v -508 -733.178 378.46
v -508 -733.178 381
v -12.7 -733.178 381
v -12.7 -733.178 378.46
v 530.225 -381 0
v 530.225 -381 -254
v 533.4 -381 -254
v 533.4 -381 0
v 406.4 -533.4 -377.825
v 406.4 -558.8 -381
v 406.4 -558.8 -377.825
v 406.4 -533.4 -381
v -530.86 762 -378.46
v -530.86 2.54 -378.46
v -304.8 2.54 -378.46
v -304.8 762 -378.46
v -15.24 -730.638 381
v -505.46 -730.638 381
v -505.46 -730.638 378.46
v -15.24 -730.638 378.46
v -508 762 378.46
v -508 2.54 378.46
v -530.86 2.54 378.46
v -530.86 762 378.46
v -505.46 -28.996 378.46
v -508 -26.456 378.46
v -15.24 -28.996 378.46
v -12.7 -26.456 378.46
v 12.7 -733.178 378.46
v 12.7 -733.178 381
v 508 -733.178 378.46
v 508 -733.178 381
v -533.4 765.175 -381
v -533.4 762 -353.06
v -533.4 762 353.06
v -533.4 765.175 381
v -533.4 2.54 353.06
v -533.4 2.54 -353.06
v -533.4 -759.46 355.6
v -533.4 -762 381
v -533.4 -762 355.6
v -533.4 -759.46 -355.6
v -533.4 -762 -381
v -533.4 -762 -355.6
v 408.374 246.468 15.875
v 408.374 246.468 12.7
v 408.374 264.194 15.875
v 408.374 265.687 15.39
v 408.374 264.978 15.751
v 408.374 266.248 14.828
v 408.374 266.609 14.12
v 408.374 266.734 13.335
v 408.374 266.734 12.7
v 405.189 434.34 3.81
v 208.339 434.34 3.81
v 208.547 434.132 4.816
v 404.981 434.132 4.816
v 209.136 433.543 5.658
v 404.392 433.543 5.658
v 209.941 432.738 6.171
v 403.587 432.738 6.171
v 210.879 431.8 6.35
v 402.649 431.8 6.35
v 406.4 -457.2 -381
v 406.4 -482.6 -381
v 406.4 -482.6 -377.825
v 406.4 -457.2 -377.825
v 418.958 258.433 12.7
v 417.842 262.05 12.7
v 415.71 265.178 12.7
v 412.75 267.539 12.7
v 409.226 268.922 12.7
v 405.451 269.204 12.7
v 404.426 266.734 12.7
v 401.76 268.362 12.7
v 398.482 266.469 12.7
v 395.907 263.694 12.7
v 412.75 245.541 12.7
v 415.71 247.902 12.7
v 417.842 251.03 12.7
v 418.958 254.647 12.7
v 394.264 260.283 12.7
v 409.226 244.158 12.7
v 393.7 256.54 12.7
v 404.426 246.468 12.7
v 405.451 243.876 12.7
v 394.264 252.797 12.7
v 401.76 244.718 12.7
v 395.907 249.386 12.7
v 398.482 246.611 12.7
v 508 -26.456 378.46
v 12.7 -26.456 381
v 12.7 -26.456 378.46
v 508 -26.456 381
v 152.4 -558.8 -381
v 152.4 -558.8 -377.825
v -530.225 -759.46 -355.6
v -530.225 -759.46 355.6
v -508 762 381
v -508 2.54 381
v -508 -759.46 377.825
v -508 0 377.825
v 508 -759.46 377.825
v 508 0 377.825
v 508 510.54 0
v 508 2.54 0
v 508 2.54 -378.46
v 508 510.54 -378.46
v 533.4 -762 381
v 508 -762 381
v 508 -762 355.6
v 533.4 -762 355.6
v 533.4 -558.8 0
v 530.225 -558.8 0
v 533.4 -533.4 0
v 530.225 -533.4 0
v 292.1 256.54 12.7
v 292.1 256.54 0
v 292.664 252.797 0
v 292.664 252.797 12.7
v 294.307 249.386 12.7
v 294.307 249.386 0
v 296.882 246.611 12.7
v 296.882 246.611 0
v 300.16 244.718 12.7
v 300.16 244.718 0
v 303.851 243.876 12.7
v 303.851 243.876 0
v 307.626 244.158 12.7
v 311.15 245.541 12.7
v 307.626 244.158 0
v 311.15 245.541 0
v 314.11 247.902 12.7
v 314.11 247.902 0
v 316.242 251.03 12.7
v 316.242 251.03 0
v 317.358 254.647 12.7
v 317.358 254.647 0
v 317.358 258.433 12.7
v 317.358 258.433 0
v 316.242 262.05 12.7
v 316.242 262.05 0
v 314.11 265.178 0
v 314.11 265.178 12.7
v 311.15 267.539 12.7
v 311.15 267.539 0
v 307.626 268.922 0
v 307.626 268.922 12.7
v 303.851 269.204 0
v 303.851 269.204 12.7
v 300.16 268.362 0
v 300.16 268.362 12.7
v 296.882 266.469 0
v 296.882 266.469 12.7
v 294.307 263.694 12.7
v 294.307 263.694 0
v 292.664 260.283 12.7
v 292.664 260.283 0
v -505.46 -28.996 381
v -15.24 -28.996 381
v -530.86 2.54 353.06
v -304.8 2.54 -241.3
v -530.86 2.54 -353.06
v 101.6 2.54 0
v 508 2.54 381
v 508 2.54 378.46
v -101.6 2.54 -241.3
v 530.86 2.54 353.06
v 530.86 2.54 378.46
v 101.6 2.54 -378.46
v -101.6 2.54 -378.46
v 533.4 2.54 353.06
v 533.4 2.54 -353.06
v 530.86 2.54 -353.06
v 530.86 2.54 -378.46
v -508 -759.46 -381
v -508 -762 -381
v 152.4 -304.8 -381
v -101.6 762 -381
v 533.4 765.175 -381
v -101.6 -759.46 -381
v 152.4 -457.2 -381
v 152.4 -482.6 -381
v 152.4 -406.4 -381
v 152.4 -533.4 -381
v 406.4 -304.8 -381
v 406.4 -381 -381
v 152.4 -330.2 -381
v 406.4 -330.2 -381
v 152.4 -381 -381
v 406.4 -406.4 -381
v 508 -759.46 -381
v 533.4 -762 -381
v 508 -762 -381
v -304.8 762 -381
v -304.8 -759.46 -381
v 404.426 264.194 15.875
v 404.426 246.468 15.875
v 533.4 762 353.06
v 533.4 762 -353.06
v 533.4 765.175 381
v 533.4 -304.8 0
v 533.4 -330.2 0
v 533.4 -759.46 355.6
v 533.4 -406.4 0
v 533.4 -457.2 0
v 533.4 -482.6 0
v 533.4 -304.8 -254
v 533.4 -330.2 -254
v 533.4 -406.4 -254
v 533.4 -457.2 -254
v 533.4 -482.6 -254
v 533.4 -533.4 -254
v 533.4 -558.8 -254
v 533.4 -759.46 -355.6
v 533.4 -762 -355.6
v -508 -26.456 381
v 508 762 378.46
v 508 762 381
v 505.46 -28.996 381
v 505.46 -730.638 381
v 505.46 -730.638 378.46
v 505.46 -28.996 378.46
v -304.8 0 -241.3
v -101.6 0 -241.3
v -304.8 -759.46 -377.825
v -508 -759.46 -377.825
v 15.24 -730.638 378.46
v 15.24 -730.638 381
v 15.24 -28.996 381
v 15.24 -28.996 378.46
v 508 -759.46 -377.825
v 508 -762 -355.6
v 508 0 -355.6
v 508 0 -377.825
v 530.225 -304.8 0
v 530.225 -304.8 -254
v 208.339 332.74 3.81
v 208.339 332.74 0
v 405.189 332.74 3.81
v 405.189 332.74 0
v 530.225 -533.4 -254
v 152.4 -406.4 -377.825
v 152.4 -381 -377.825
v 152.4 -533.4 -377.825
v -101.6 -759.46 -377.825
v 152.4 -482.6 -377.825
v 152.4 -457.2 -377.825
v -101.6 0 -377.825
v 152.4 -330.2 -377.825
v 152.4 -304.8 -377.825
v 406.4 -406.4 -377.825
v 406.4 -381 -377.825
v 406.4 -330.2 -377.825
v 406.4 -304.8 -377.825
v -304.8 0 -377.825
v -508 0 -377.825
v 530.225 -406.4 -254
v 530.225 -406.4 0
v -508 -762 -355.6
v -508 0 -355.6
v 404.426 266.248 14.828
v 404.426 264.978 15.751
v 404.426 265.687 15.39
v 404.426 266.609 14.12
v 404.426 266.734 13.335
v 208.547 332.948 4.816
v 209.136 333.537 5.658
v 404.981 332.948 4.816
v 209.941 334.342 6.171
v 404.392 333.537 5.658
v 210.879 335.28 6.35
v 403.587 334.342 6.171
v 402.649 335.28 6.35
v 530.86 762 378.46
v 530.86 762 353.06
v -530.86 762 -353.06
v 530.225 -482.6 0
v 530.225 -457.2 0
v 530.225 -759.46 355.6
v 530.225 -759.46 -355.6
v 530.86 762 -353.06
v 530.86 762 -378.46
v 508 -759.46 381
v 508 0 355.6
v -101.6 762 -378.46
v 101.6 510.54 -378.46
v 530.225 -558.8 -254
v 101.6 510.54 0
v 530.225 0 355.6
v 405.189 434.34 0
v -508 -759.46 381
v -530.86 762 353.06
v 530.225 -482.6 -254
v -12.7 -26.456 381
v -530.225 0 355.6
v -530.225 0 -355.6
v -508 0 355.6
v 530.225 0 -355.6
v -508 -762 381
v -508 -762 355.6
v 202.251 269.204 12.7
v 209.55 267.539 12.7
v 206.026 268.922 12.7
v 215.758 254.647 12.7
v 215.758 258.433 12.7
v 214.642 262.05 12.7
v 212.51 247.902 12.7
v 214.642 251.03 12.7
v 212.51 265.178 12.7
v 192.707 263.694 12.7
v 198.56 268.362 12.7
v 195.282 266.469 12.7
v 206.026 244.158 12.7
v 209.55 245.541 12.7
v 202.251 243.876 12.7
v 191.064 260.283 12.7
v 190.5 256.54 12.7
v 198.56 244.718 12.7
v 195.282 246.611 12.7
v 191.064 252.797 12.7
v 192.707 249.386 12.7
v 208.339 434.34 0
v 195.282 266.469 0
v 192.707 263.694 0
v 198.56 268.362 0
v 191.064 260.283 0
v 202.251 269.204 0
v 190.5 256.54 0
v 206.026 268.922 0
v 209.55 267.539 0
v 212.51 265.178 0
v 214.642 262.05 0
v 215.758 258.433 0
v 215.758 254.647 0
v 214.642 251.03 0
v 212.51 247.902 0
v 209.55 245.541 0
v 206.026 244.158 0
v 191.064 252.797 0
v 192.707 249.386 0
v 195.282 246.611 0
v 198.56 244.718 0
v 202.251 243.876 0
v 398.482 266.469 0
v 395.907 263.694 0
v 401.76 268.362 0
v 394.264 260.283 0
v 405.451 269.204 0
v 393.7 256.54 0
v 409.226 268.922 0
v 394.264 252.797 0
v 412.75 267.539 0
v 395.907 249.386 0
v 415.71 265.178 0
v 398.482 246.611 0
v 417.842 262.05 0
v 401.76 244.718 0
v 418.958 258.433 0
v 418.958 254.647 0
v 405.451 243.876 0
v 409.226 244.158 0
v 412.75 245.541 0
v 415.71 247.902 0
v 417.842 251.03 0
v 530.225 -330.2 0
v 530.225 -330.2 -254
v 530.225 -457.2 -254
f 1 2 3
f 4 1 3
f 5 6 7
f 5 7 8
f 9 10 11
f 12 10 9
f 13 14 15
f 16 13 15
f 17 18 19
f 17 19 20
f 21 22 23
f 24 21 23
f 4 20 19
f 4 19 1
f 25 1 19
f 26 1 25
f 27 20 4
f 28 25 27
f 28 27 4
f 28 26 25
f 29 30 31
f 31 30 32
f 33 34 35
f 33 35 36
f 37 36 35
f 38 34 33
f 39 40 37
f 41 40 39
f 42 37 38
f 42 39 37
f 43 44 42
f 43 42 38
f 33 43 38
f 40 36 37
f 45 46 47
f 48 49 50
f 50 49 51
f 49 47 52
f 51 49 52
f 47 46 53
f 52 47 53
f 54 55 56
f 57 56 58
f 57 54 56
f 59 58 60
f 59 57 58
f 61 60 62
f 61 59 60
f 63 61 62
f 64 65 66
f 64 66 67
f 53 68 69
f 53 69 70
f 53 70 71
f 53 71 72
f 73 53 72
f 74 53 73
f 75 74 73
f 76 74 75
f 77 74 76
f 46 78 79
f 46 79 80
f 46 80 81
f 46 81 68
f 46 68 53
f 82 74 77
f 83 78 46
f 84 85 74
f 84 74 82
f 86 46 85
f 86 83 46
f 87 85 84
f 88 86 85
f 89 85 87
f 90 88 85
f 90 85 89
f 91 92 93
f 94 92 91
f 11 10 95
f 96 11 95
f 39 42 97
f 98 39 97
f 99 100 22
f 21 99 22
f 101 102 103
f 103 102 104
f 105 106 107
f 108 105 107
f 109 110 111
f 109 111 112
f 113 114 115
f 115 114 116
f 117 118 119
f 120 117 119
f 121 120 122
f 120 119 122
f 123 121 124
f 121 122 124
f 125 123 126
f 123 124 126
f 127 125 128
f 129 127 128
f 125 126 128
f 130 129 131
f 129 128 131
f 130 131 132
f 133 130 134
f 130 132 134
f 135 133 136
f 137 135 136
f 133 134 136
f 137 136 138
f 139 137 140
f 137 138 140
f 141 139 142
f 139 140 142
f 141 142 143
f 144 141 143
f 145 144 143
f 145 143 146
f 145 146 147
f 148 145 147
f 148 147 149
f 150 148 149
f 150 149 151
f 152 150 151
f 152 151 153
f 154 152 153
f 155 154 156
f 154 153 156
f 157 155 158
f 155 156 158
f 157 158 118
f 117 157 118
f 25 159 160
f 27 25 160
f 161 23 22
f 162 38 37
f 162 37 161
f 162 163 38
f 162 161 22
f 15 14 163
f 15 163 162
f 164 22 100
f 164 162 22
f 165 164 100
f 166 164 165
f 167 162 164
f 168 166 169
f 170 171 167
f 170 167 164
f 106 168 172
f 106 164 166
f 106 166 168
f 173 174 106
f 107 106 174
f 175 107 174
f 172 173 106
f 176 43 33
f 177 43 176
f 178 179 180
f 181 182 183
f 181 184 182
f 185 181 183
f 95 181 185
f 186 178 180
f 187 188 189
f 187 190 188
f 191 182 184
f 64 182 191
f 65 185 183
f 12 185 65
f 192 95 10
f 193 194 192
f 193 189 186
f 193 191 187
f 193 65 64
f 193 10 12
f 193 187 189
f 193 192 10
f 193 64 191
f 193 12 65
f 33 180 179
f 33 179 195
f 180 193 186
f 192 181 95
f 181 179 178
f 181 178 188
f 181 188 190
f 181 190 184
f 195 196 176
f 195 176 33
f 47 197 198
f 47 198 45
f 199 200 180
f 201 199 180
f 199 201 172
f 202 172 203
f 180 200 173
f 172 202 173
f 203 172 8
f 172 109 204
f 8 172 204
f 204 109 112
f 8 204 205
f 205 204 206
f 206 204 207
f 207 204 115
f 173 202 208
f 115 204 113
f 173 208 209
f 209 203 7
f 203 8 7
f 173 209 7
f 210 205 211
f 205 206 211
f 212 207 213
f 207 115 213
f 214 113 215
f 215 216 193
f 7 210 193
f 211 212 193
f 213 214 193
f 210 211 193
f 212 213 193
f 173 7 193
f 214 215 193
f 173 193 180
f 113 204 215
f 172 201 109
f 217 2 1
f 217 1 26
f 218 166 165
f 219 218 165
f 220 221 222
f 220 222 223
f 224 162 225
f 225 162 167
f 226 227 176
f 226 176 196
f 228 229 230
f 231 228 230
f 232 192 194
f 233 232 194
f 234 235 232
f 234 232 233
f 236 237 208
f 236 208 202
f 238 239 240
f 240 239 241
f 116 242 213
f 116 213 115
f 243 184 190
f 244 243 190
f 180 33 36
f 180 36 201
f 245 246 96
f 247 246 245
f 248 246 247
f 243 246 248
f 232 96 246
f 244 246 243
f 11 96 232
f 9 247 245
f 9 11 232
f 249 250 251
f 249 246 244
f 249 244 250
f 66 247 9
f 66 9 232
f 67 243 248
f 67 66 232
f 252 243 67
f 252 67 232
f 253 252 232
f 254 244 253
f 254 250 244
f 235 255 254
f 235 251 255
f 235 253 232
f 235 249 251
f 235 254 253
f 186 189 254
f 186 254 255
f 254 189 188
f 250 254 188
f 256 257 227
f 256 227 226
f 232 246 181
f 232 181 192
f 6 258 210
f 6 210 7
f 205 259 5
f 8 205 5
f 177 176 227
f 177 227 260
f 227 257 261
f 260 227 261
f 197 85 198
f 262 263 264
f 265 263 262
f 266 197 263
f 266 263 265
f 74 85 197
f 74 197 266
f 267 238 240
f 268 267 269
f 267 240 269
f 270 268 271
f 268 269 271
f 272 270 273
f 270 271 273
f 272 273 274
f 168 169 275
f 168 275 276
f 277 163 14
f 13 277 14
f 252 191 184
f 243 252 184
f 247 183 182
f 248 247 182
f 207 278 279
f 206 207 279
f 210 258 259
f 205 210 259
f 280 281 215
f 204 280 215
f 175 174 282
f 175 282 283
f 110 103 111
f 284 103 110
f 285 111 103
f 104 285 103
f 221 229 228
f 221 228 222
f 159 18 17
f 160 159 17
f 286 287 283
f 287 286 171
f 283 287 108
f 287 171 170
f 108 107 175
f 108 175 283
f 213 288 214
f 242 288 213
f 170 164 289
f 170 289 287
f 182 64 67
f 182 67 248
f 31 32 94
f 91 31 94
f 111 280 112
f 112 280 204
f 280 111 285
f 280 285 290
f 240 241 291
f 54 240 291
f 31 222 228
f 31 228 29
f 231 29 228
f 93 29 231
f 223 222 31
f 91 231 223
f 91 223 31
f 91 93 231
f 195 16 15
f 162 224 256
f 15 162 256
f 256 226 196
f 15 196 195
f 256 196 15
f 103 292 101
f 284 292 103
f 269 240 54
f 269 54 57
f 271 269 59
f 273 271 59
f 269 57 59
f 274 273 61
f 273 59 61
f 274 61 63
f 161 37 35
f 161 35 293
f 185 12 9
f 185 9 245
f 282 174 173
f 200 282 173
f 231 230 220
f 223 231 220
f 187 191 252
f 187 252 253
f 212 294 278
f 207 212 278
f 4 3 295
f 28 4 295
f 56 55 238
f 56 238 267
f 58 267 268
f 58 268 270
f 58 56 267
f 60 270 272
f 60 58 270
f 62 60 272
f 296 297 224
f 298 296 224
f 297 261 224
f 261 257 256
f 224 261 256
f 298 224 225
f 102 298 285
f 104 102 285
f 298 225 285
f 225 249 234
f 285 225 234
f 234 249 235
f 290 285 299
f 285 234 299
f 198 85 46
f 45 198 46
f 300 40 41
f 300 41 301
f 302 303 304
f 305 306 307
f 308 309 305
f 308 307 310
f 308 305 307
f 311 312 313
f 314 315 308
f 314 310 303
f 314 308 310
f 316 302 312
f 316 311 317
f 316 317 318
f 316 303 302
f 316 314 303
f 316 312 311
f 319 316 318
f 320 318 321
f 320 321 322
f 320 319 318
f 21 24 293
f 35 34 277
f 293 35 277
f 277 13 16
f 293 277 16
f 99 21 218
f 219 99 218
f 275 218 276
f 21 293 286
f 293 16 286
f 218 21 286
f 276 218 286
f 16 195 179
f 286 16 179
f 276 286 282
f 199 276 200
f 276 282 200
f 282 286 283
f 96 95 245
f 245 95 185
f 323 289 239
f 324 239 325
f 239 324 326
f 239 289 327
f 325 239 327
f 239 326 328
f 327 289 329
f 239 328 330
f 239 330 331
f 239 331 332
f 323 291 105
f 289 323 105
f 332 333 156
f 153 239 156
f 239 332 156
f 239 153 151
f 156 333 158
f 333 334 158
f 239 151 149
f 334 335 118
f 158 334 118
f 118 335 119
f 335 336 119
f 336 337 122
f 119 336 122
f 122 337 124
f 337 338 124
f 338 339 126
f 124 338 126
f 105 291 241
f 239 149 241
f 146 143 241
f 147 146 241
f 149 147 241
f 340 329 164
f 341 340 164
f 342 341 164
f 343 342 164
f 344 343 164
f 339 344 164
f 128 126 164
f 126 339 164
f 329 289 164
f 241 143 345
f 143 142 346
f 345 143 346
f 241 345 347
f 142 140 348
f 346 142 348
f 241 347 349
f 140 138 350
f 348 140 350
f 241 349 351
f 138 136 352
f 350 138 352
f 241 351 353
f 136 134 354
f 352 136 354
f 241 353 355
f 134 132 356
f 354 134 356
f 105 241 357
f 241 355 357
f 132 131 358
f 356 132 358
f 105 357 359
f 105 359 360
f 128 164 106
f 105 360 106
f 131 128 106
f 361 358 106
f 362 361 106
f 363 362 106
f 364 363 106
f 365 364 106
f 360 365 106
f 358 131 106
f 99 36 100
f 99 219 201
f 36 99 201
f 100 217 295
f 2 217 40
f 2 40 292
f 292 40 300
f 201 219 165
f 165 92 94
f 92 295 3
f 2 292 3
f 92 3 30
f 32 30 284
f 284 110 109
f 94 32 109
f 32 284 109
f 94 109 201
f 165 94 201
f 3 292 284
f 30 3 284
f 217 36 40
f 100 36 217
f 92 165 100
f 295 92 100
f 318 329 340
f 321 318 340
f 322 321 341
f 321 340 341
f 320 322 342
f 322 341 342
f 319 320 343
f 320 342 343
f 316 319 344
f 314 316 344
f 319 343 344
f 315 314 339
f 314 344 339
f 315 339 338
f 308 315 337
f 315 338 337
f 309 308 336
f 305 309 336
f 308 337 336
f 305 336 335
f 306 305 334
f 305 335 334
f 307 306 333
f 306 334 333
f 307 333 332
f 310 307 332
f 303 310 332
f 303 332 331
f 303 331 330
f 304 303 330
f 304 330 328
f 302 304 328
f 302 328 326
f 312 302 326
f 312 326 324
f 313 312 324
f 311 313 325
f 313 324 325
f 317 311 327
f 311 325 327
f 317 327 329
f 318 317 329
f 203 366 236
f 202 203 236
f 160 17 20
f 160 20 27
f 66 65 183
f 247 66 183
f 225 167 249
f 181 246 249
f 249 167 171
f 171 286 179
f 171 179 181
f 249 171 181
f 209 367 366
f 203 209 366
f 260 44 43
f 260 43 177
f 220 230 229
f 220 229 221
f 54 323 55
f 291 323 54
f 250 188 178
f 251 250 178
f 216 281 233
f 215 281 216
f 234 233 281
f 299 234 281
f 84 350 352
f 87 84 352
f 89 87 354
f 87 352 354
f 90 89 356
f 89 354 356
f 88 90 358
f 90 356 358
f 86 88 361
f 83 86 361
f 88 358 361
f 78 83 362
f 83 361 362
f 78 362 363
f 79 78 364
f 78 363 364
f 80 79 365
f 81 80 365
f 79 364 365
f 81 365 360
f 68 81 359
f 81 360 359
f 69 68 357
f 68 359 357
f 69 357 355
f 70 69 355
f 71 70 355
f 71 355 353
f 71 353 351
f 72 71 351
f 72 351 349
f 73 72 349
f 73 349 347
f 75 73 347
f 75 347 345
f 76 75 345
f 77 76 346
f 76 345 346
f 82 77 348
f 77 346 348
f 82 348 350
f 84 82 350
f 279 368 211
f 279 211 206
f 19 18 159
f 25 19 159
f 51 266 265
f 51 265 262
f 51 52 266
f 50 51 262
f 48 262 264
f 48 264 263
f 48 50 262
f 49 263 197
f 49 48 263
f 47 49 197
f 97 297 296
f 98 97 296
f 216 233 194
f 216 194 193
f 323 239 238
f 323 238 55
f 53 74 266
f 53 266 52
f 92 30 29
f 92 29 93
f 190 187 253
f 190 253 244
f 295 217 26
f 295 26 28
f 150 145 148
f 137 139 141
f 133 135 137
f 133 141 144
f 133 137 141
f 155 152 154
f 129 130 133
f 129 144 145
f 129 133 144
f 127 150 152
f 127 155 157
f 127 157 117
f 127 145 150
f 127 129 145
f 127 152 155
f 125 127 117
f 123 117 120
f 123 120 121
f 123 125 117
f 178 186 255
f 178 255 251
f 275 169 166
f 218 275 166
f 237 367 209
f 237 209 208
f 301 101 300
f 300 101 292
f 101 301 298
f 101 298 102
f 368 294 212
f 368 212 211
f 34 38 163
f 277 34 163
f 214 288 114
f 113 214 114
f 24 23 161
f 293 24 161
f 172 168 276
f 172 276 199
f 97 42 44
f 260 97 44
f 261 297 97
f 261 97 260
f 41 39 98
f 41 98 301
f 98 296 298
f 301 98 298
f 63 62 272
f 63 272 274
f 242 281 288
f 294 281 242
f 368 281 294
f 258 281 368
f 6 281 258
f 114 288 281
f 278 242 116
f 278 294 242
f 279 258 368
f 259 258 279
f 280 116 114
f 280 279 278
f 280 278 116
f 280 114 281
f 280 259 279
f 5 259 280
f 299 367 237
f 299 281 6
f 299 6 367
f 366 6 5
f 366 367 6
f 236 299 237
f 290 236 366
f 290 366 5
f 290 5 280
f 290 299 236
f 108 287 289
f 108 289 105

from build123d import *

# Parameters (mm, degrees)
SKETCH1_W            = 1066.8
SKETCH1_H            = 762
BOSS_EXTRUDE1_DEPTH  = 2.54
SKETCH2_W            = 203.2
SKETCH2_H            = 139.7
CUT_EXTRUDE1_DEPTH   = 656.50210648
SKETCH3_W            = 25.4
SKETCH3_H            = 25.4
BOSS_EXTRUDE2_DEPTH  = 762
SKETCH4_W            = 406.4
SKETCH4_H            = 381
BOSS_EXTRUDE3_DEPTH  = 508
SKETCH5_R            = 12.7
BOSS_EXTRUDE4_DEPTH  = 12.7
SKETCH6_W            = 3.94766101
SKETCH6_H            = 20.265990969
BOSS_EXTRUDE5_DEPTH  = 3.175
FILLET1_R            = 2.54
SKETCH7_W            = 196.85
SKETCH7_H            = 101.6
BOSS_EXTRUDE6_DEPTH  = 6.35
FILLET2_R            = 2.54
SKETCH8_W            = 2.54
SKETCH8_H            = 25.4
SKETCH8_W_2          = 203.2
SKETCH8_H_2          = 2.54
SKETCH8_W_3          = 406.4
BOSS_EXTRUDE7_DEPTH  = 759.46
SKETCH9_W            = 1066.8
SKETCH9_H            = 762
BOSS_EXTRUDE8_DEPTH  = 3.175
SKETCH11_W           = 1016
SKETCH11_H           = 3.175
SKETCH11_W_2         = 3.175
SKETCH11_H_2         = 711.2
SKETCH11_W_3         = 203.2
SKETCH11_W_4         = 609.6
BOSS_EXTRUDE10_DEPTH = 759.46
CUT_EXTRUDE3_REACH   = 1366.534
SKETCH12_W           = 254
SKETCH12_H           = 25.4
CUT_EXTRUDE4_REACH   = 1206.43
SKETCH13_W           = 254
SKETCH13_H           = 25.4
SKETCH14_W           = 495.3
SKETCH14_H           = 706.721299259
SKETCH14_W_2         = 490.22
SKETCH14_H_2         = 701.641299259
CUT_EXTRUDE5_DEPTH   = 2.54


with BuildPart() as part:
    # Sketch1 → Boss-Extrude1 (new body)
    with BuildSketch(Plane(origin=(0, 0, 0), x_dir=(1, 0, 0), z_dir=(0, 1, 0))):
        Rectangle(SKETCH1_W, SKETCH1_H)
    extrude(amount=BOSS_EXTRUDE1_DEPTH)

    # Sketch2 → Cut-Extrude1 (cut, through all)
    with BuildSketch(Plane(origin=(0, 2.54, 0), x_dir=(1, 0, 0), z_dir=(0, 1, 0))):
        with Locations((-203.2, 311.15)):
            Rectangle(SKETCH2_W, SKETCH2_H)
    extrude(amount=-CUT_EXTRUDE1_DEPTH, mode=Mode.SUBTRACT)

    # Sketch3 → Boss-Extrude2 (add)
    with BuildSketch(Plane.XZ):
        with Locations((-520.7, 368.3)):
            Rectangle(SKETCH3_W, SKETCH3_H)
        with Locations((520.7, 368.3)):
            Rectangle(SKETCH3_W, SKETCH3_H)
        with Locations((520.7, -368.3)):
            Rectangle(SKETCH3_W, SKETCH3_H)
        with Locations((-520.7, -368.3)):
            Rectangle(SKETCH3_W, SKETCH3_H)
    extrude(amount=BOSS_EXTRUDE2_DEPTH)

    # Sketch4 → Boss-Extrude3 (add)
    with BuildSketch(Plane(origin=(0, 2.54, 0), x_dir=(1, 0, 0), z_dir=(0, 1, 0))):
        with Locations((304.8, 190.5)):
            Rectangle(SKETCH4_W, SKETCH4_H)
    extrude(amount=BOSS_EXTRUDE3_DEPTH)

    # Sketch5 → Boss-Extrude4 (add)
    with BuildSketch(Plane.XY):
        with Locations(Location((203.2, 256.54, 0), (0, 0, 180))):
            Circle(SKETCH5_R)
        with Locations(Location((304.8, 256.54, 0), (0, 0, 180))):
            Circle(SKETCH5_R)
        with Locations(Location((406.4, 256.54, 0), (0, 0, 180))):
            Circle(SKETCH5_R)
    extrude(amount=BOSS_EXTRUDE4_DEPTH)

    # Sketch6 → Boss-Extrude5 (add)
    with BuildSketch(Plane.XY.offset(12.7)):
        with Locations((406.4, 256.600571442)):
            Rectangle(SKETCH6_W, SKETCH6_H)
    extrude(amount=BOSS_EXTRUDE5_DEPTH)

    # Fillet1
    fillet1_edges = [part.edges().sort_by_distance(p)[0] for p in [
        (406.4, 266.733566926, 15.875),
    ]]
    fillet(fillet1_edges, radius=FILLET1_R)

    # Sketch7 → Boss-Extrude6 (add)
    with BuildSketch(Plane.XY):
        with Locations((306.763896215, 383.54)):
            Rectangle(SKETCH7_W, SKETCH7_H)
    extrude(amount=BOSS_EXTRUDE6_DEPTH)

    # Fillet2
    fillet2_edges = [part.edges().sort_by_distance(p)[0] for p in [
        (208.338896215, 383.54, 6.35),
        (306.763896215, 332.74, 6.35),
        (405.188896215, 383.54, 6.35),
        (306.763896215, 434.34, 6.35),
    ]]
    fillet(fillet2_edges, radius=FILLET2_R)

    # Sketch8 → Boss-Extrude7 (add)
    with BuildSketch(Plane(origin=(0, 2.54, 0), x_dir=(1, 0, 0), z_dir=(0, 1, 0))):
        Polygon((-304.8, 381), (-533.4, 381), (-533.4, 378.46), (-530.86, 378.46), (-304.8, 378.46), align=None)
        with Locations((-532.13, 365.76)):
            Rectangle(SKETCH8_W, SKETCH8_H)
        Polygon((530.86, 378.46), (533.4, 378.46), (533.4, 381), (508, 381), (508, 378.46), align=None)
        with Locations((532.13, 365.76)):
            Rectangle(SKETCH8_W, SKETCH8_H)
        with Locations((0, 379.73)):
            Rectangle(SKETCH8_W_2, SKETCH8_H_2)
        Polygon((508, -378.46), (508, -381), (533.4, -381), (533.4, -378.46), (530.86, -378.46), align=None)
        with Locations((532.13, -365.76)):
            Rectangle(SKETCH8_W, SKETCH8_H)
        with Locations((-532.13, -365.76)):
            Rectangle(SKETCH8_W, SKETCH8_H)
        Polygon((-530.86, -378.46), (-533.4, -378.46), (-533.4, -381), (-508, -381), (-508, -378.46), align=None)
        with Locations((304.8, 379.73)):
            Rectangle(SKETCH8_W_3, SKETCH8_H_2)
    extrude(amount=BOSS_EXTRUDE7_DEPTH)

    # Sketch9 → Boss-Extrude8 (add)
    with BuildSketch(Plane(origin=(0, 762, 0), x_dir=(1, 0, 0), z_dir=(0, 1, 0))):
        Rectangle(SKETCH9_W, SKETCH9_H)
    extrude(amount=BOSS_EXTRUDE8_DEPTH)

    # Sketch11 → Boss-Extrude10 (add)
    with BuildSketch(Plane.XZ):
        with Locations((0, 379.4125)):
            Rectangle(SKETCH11_W, SKETCH11_H)
        with Locations((531.8125, 0)):
            Rectangle(SKETCH11_W_2, SKETCH11_H_2)
        with Locations((-531.8125, 0)):
            Rectangle(SKETCH11_W_2, SKETCH11_H_2)
        with Locations((-406.4, -379.4125)):
            Rectangle(SKETCH11_W_3, SKETCH11_H)
        with Locations((203.2, -379.4125)):
            Rectangle(SKETCH11_W_4, SKETCH11_H)
    extrude(amount=BOSS_EXTRUDE10_DEPTH)

    # Sketch12 → Cut-Extrude3 (cut, up to next)
    with BuildSketch(Plane.ZY.offset(-530.225), mode=Mode.PRIVATE) as cut_extrude3_sk1:
        with Locations((-127, -317.5)):
            Rectangle(SKETCH12_W, SKETCH12_H)
    cut_extrude3_tool1 = extrude(cut_extrude3_sk1.sketch, amount=-CUT_EXTRUDE3_REACH, mode=Mode.PRIVATE) & part.part
    # Sketch12 → Cut-Extrude3 (cut, up to next)
    with BuildSketch(Plane.ZY.offset(-530.225), mode=Mode.PRIVATE) as cut_extrude3_sk2:
        with Locations((-127, -393.7)):
            Rectangle(SKETCH12_W, SKETCH12_H)
    cut_extrude3_tool2 = extrude(cut_extrude3_sk2.sketch, amount=-CUT_EXTRUDE3_REACH, mode=Mode.PRIVATE) & part.part
    # Sketch12 → Cut-Extrude3 (cut, up to next)
    with BuildSketch(Plane.ZY.offset(-530.225), mode=Mode.PRIVATE) as cut_extrude3_sk3:
        with Locations((-127, -469.9)):
            Rectangle(SKETCH12_W, SKETCH12_H)
    cut_extrude3_tool3 = extrude(cut_extrude3_sk3.sketch, amount=-CUT_EXTRUDE3_REACH, mode=Mode.PRIVATE) & part.part
    # Sketch12 → Cut-Extrude3 (cut, up to next)
    with BuildSketch(Plane.ZY.offset(-530.225), mode=Mode.PRIVATE) as cut_extrude3_sk4:
        with Locations((-127, -546.1)):
            Rectangle(SKETCH12_W, SKETCH12_H)
    cut_extrude3_tool4 = extrude(cut_extrude3_sk4.sketch, amount=-CUT_EXTRUDE3_REACH, mode=Mode.PRIVATE) & part.part
    add(cut_extrude3_tool1.solids().sort_by_distance((530.225, -317.5, -127))[0], mode=Mode.SUBTRACT)
    add(cut_extrude3_tool2.solids().sort_by_distance((530.225, -393.7, -127))[0], mode=Mode.SUBTRACT)
    add(cut_extrude3_tool3.solids().sort_by_distance((530.225, -469.9, -127))[0], mode=Mode.SUBTRACT)
    add(cut_extrude3_tool4.solids().sort_by_distance((530.225, -546.1, -127))[0], mode=Mode.SUBTRACT)

    # Sketch13 → Cut-Extrude4 (cut, up to next)
    with BuildSketch(Plane(origin=(0, 0, -381), x_dir=(-1, 0, 0), z_dir=(0, 0, -1)), mode=Mode.PRIVATE) as cut_extrude4_sk1:
        with Locations((-279.4, -317.5)):
            Rectangle(SKETCH13_W, SKETCH13_H)
    cut_extrude4_tool1 = extrude(cut_extrude4_sk1.sketch, amount=-CUT_EXTRUDE4_REACH, mode=Mode.PRIVATE) & part.part
    # Sketch13 → Cut-Extrude4 (cut, up to next)
    with BuildSketch(Plane(origin=(0, 0, -381), x_dir=(-1, 0, 0), z_dir=(0, 0, -1)), mode=Mode.PRIVATE) as cut_extrude4_sk2:
        with Locations((-279.4, -393.7)):
            Rectangle(SKETCH13_W, SKETCH13_H)
    cut_extrude4_tool2 = extrude(cut_extrude4_sk2.sketch, amount=-CUT_EXTRUDE4_REACH, mode=Mode.PRIVATE) & part.part
    # Sketch13 → Cut-Extrude4 (cut, up to next)
    with BuildSketch(Plane(origin=(0, 0, -381), x_dir=(-1, 0, 0), z_dir=(0, 0, -1)), mode=Mode.PRIVATE) as cut_extrude4_sk3:
        with Locations((-279.4, -469.9)):
            Rectangle(SKETCH13_W, SKETCH13_H)
    cut_extrude4_tool3 = extrude(cut_extrude4_sk3.sketch, amount=-CUT_EXTRUDE4_REACH, mode=Mode.PRIVATE) & part.part
    # Sketch13 → Cut-Extrude4 (cut, up to next)
    with BuildSketch(Plane(origin=(0, 0, -381), x_dir=(-1, 0, 0), z_dir=(0, 0, -1)), mode=Mode.PRIVATE) as cut_extrude4_sk4:
        with Locations((-279.4, -546.1)):
            Rectangle(SKETCH13_W, SKETCH13_H)
    cut_extrude4_tool4 = extrude(cut_extrude4_sk4.sketch, amount=-CUT_EXTRUDE4_REACH, mode=Mode.PRIVATE) & part.part
    add(cut_extrude4_tool1.solids().sort_by_distance((279.4, -317.5, -381))[0], mode=Mode.SUBTRACT)
    add(cut_extrude4_tool2.solids().sort_by_distance((279.4, -393.7, -381))[0], mode=Mode.SUBTRACT)
    add(cut_extrude4_tool3.solids().sort_by_distance((279.4, -469.9, -381))[0], mode=Mode.SUBTRACT)
    add(cut_extrude4_tool4.solids().sort_by_distance((279.4, -546.1, -381))[0], mode=Mode.SUBTRACT)

    # Sketch14 → Cut-Extrude5 (cut)
    # profile 1 of 2: a face of its own
    with BuildSketch(Plane.XY.offset(381)):
        with Locations((-260.35, -379.817122747)):
            Rectangle(SKETCH14_W, SKETCH14_H)
        with Locations((-260.35, -379.817122748)):
            Rectangle(SKETCH14_W_2, SKETCH14_H_2, mode=Mode.SUBTRACT)
    # profile 2 of 2: a face of its own
    with BuildSketch(Plane.XY.offset(381)):
        with Locations((260.35, -379.817122747)):
            Rectangle(SKETCH14_W, SKETCH14_H)
        with Locations((260.35, -379.817122748)):
            Rectangle(SKETCH14_W_2, SKETCH14_H_2, mode=Mode.SUBTRACT)
    extrude(amount=-CUT_EXTRUDE5_DEPTH, mode=Mode.SUBTRACT)


solid = part.part
